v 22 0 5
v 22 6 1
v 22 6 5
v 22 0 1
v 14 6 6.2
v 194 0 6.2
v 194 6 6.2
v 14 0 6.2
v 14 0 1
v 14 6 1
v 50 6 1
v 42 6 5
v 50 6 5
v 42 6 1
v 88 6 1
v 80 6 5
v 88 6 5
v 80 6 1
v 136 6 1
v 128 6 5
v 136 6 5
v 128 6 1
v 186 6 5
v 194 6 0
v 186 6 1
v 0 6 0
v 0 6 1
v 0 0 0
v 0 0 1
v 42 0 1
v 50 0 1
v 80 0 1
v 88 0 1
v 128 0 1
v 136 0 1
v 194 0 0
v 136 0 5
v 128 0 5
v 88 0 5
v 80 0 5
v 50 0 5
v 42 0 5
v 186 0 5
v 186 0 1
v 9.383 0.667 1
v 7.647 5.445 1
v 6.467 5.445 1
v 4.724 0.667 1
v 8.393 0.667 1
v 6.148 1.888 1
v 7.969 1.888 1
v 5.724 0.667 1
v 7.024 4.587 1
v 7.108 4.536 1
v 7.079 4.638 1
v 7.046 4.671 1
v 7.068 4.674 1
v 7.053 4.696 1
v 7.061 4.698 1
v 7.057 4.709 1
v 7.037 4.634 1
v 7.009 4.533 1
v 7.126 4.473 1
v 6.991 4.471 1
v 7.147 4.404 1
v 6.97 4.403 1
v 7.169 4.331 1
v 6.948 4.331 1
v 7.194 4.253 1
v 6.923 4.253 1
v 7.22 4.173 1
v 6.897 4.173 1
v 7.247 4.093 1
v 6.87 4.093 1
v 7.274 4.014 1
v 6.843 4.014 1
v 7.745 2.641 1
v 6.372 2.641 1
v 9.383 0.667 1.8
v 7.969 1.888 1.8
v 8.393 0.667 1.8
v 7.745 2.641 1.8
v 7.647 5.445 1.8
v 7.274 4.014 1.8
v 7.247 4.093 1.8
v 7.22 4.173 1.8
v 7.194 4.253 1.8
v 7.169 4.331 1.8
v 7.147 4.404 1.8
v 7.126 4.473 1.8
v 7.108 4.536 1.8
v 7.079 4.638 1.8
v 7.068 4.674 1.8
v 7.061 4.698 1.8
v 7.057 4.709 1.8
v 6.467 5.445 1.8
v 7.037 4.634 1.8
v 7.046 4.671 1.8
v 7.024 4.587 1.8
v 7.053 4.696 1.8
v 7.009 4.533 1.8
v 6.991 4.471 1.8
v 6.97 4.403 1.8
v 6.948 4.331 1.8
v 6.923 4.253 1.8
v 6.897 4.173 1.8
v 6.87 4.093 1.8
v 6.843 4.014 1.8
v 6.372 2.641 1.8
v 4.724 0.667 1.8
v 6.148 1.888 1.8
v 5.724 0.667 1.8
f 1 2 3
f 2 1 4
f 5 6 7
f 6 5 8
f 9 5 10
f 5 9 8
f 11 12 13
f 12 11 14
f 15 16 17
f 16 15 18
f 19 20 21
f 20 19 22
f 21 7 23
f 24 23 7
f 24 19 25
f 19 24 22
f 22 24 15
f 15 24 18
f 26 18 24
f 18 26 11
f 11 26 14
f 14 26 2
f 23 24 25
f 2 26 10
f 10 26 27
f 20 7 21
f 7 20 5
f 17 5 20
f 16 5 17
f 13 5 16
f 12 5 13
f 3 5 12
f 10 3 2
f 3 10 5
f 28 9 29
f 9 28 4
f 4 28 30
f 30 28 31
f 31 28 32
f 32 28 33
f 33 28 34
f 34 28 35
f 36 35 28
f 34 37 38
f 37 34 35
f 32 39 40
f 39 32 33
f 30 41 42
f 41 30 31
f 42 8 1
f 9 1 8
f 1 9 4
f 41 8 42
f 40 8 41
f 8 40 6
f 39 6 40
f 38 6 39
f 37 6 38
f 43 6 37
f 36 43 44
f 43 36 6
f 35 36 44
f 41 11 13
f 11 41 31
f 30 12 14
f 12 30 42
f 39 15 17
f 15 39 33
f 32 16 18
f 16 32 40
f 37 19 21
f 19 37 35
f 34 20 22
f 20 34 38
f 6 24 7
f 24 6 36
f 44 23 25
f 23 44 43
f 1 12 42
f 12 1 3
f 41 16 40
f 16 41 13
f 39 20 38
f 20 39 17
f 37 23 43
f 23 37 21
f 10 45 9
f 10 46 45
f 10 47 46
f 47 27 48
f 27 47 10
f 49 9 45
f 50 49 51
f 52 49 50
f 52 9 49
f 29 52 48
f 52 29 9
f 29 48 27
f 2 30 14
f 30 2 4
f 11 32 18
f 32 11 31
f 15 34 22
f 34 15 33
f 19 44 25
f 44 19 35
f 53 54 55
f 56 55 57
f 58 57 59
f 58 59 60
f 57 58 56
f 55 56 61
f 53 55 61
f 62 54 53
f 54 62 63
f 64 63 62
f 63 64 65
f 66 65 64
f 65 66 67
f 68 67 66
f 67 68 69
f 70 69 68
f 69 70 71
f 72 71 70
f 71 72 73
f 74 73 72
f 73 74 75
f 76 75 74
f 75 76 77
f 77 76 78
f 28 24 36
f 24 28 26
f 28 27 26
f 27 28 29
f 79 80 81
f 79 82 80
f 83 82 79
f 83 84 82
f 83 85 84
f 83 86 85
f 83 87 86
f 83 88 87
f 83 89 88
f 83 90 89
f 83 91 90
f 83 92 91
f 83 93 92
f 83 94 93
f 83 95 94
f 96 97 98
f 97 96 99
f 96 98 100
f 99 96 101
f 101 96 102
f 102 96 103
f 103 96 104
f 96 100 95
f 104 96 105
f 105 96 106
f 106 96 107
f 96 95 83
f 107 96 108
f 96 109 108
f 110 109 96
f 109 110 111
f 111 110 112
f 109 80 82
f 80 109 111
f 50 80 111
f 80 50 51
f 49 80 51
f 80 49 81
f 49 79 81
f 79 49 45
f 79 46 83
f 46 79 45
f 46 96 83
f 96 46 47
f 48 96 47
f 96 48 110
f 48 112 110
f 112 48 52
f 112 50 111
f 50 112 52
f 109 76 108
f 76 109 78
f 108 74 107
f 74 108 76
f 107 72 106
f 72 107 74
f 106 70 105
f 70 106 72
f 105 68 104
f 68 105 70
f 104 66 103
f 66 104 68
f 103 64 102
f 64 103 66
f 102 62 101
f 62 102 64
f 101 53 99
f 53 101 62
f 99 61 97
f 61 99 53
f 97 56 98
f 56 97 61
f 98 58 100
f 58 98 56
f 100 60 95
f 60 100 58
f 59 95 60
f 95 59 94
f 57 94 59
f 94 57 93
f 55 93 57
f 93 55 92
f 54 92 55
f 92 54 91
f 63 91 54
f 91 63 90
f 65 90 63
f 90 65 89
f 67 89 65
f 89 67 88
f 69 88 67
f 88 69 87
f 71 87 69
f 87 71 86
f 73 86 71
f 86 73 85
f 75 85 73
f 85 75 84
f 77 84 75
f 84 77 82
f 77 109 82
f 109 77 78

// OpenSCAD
// Bridge A/B coupon (2026-11-24).
// Scott, on a bridge test from elsewhere: "Good for the smallest one. The rest have stringing
// slightly on the underside. Is there a better way to achieve these". The same pattern as the
// ironing test that settled our ironing: one part, printed four times on one plate, each copy
// sliced with different bridge settings (see README.md), a raised letter on each to tell them
// apart.
//
// One strip: square pillars on a slab, with bridges of 20, 30, 40 and 50 mm between them.
// Each deck is DECK thick: one slice layer bridges, the rest is solid on top of it, as on a real
// part. The pillars are square walls, so every bridge has a solid anchor at both ends (an anchor
// on a curve sags at a span that's trivial between walls: knowledge base 3.5).
//
//   label = "A" .. "D"

label = "A";
SPANS = [20, 30, 40, 50];   // Scott's test was already good at the smallest span; 10 mm is dropped
P = 8;        // pillar, square
PH = 4;       // pillar height above the slab: room enough to see a strand hang
W = 6;        // the strip's width: pillars and decks
DECK = 1.2;   // six layers at 0.2
SLAB = 1.0;

function xs(i) = i == 0 ? 0 : xs(i - 1) + P + SPANS[i - 1];
L = xs(len(SPANS)) + P;   // overall length

module strip() union() {
    cube([L + 14, W, SLAB]);                                        // the slab, 14 longer for the label
    for (i = [0 : len(SPANS)]) translate([14 + xs(i), 0, SLAB - 0.01]) cube([P, W, PH + DECK + 0.01]);
    for (i = [0 : len(SPANS) - 1]) translate([14 + xs(i) + P - 0.01, 0, SLAB + PH]) cube([SPANS[i] + 0.02, W, DECK]);
    translate([7, W / 2, SLAB - 0.01]) linear_extrude(0.81)
        text(label, size = 5, font = "Liberation Sans:style=Bold", halign = "center", valign = "center");
}
strip();
